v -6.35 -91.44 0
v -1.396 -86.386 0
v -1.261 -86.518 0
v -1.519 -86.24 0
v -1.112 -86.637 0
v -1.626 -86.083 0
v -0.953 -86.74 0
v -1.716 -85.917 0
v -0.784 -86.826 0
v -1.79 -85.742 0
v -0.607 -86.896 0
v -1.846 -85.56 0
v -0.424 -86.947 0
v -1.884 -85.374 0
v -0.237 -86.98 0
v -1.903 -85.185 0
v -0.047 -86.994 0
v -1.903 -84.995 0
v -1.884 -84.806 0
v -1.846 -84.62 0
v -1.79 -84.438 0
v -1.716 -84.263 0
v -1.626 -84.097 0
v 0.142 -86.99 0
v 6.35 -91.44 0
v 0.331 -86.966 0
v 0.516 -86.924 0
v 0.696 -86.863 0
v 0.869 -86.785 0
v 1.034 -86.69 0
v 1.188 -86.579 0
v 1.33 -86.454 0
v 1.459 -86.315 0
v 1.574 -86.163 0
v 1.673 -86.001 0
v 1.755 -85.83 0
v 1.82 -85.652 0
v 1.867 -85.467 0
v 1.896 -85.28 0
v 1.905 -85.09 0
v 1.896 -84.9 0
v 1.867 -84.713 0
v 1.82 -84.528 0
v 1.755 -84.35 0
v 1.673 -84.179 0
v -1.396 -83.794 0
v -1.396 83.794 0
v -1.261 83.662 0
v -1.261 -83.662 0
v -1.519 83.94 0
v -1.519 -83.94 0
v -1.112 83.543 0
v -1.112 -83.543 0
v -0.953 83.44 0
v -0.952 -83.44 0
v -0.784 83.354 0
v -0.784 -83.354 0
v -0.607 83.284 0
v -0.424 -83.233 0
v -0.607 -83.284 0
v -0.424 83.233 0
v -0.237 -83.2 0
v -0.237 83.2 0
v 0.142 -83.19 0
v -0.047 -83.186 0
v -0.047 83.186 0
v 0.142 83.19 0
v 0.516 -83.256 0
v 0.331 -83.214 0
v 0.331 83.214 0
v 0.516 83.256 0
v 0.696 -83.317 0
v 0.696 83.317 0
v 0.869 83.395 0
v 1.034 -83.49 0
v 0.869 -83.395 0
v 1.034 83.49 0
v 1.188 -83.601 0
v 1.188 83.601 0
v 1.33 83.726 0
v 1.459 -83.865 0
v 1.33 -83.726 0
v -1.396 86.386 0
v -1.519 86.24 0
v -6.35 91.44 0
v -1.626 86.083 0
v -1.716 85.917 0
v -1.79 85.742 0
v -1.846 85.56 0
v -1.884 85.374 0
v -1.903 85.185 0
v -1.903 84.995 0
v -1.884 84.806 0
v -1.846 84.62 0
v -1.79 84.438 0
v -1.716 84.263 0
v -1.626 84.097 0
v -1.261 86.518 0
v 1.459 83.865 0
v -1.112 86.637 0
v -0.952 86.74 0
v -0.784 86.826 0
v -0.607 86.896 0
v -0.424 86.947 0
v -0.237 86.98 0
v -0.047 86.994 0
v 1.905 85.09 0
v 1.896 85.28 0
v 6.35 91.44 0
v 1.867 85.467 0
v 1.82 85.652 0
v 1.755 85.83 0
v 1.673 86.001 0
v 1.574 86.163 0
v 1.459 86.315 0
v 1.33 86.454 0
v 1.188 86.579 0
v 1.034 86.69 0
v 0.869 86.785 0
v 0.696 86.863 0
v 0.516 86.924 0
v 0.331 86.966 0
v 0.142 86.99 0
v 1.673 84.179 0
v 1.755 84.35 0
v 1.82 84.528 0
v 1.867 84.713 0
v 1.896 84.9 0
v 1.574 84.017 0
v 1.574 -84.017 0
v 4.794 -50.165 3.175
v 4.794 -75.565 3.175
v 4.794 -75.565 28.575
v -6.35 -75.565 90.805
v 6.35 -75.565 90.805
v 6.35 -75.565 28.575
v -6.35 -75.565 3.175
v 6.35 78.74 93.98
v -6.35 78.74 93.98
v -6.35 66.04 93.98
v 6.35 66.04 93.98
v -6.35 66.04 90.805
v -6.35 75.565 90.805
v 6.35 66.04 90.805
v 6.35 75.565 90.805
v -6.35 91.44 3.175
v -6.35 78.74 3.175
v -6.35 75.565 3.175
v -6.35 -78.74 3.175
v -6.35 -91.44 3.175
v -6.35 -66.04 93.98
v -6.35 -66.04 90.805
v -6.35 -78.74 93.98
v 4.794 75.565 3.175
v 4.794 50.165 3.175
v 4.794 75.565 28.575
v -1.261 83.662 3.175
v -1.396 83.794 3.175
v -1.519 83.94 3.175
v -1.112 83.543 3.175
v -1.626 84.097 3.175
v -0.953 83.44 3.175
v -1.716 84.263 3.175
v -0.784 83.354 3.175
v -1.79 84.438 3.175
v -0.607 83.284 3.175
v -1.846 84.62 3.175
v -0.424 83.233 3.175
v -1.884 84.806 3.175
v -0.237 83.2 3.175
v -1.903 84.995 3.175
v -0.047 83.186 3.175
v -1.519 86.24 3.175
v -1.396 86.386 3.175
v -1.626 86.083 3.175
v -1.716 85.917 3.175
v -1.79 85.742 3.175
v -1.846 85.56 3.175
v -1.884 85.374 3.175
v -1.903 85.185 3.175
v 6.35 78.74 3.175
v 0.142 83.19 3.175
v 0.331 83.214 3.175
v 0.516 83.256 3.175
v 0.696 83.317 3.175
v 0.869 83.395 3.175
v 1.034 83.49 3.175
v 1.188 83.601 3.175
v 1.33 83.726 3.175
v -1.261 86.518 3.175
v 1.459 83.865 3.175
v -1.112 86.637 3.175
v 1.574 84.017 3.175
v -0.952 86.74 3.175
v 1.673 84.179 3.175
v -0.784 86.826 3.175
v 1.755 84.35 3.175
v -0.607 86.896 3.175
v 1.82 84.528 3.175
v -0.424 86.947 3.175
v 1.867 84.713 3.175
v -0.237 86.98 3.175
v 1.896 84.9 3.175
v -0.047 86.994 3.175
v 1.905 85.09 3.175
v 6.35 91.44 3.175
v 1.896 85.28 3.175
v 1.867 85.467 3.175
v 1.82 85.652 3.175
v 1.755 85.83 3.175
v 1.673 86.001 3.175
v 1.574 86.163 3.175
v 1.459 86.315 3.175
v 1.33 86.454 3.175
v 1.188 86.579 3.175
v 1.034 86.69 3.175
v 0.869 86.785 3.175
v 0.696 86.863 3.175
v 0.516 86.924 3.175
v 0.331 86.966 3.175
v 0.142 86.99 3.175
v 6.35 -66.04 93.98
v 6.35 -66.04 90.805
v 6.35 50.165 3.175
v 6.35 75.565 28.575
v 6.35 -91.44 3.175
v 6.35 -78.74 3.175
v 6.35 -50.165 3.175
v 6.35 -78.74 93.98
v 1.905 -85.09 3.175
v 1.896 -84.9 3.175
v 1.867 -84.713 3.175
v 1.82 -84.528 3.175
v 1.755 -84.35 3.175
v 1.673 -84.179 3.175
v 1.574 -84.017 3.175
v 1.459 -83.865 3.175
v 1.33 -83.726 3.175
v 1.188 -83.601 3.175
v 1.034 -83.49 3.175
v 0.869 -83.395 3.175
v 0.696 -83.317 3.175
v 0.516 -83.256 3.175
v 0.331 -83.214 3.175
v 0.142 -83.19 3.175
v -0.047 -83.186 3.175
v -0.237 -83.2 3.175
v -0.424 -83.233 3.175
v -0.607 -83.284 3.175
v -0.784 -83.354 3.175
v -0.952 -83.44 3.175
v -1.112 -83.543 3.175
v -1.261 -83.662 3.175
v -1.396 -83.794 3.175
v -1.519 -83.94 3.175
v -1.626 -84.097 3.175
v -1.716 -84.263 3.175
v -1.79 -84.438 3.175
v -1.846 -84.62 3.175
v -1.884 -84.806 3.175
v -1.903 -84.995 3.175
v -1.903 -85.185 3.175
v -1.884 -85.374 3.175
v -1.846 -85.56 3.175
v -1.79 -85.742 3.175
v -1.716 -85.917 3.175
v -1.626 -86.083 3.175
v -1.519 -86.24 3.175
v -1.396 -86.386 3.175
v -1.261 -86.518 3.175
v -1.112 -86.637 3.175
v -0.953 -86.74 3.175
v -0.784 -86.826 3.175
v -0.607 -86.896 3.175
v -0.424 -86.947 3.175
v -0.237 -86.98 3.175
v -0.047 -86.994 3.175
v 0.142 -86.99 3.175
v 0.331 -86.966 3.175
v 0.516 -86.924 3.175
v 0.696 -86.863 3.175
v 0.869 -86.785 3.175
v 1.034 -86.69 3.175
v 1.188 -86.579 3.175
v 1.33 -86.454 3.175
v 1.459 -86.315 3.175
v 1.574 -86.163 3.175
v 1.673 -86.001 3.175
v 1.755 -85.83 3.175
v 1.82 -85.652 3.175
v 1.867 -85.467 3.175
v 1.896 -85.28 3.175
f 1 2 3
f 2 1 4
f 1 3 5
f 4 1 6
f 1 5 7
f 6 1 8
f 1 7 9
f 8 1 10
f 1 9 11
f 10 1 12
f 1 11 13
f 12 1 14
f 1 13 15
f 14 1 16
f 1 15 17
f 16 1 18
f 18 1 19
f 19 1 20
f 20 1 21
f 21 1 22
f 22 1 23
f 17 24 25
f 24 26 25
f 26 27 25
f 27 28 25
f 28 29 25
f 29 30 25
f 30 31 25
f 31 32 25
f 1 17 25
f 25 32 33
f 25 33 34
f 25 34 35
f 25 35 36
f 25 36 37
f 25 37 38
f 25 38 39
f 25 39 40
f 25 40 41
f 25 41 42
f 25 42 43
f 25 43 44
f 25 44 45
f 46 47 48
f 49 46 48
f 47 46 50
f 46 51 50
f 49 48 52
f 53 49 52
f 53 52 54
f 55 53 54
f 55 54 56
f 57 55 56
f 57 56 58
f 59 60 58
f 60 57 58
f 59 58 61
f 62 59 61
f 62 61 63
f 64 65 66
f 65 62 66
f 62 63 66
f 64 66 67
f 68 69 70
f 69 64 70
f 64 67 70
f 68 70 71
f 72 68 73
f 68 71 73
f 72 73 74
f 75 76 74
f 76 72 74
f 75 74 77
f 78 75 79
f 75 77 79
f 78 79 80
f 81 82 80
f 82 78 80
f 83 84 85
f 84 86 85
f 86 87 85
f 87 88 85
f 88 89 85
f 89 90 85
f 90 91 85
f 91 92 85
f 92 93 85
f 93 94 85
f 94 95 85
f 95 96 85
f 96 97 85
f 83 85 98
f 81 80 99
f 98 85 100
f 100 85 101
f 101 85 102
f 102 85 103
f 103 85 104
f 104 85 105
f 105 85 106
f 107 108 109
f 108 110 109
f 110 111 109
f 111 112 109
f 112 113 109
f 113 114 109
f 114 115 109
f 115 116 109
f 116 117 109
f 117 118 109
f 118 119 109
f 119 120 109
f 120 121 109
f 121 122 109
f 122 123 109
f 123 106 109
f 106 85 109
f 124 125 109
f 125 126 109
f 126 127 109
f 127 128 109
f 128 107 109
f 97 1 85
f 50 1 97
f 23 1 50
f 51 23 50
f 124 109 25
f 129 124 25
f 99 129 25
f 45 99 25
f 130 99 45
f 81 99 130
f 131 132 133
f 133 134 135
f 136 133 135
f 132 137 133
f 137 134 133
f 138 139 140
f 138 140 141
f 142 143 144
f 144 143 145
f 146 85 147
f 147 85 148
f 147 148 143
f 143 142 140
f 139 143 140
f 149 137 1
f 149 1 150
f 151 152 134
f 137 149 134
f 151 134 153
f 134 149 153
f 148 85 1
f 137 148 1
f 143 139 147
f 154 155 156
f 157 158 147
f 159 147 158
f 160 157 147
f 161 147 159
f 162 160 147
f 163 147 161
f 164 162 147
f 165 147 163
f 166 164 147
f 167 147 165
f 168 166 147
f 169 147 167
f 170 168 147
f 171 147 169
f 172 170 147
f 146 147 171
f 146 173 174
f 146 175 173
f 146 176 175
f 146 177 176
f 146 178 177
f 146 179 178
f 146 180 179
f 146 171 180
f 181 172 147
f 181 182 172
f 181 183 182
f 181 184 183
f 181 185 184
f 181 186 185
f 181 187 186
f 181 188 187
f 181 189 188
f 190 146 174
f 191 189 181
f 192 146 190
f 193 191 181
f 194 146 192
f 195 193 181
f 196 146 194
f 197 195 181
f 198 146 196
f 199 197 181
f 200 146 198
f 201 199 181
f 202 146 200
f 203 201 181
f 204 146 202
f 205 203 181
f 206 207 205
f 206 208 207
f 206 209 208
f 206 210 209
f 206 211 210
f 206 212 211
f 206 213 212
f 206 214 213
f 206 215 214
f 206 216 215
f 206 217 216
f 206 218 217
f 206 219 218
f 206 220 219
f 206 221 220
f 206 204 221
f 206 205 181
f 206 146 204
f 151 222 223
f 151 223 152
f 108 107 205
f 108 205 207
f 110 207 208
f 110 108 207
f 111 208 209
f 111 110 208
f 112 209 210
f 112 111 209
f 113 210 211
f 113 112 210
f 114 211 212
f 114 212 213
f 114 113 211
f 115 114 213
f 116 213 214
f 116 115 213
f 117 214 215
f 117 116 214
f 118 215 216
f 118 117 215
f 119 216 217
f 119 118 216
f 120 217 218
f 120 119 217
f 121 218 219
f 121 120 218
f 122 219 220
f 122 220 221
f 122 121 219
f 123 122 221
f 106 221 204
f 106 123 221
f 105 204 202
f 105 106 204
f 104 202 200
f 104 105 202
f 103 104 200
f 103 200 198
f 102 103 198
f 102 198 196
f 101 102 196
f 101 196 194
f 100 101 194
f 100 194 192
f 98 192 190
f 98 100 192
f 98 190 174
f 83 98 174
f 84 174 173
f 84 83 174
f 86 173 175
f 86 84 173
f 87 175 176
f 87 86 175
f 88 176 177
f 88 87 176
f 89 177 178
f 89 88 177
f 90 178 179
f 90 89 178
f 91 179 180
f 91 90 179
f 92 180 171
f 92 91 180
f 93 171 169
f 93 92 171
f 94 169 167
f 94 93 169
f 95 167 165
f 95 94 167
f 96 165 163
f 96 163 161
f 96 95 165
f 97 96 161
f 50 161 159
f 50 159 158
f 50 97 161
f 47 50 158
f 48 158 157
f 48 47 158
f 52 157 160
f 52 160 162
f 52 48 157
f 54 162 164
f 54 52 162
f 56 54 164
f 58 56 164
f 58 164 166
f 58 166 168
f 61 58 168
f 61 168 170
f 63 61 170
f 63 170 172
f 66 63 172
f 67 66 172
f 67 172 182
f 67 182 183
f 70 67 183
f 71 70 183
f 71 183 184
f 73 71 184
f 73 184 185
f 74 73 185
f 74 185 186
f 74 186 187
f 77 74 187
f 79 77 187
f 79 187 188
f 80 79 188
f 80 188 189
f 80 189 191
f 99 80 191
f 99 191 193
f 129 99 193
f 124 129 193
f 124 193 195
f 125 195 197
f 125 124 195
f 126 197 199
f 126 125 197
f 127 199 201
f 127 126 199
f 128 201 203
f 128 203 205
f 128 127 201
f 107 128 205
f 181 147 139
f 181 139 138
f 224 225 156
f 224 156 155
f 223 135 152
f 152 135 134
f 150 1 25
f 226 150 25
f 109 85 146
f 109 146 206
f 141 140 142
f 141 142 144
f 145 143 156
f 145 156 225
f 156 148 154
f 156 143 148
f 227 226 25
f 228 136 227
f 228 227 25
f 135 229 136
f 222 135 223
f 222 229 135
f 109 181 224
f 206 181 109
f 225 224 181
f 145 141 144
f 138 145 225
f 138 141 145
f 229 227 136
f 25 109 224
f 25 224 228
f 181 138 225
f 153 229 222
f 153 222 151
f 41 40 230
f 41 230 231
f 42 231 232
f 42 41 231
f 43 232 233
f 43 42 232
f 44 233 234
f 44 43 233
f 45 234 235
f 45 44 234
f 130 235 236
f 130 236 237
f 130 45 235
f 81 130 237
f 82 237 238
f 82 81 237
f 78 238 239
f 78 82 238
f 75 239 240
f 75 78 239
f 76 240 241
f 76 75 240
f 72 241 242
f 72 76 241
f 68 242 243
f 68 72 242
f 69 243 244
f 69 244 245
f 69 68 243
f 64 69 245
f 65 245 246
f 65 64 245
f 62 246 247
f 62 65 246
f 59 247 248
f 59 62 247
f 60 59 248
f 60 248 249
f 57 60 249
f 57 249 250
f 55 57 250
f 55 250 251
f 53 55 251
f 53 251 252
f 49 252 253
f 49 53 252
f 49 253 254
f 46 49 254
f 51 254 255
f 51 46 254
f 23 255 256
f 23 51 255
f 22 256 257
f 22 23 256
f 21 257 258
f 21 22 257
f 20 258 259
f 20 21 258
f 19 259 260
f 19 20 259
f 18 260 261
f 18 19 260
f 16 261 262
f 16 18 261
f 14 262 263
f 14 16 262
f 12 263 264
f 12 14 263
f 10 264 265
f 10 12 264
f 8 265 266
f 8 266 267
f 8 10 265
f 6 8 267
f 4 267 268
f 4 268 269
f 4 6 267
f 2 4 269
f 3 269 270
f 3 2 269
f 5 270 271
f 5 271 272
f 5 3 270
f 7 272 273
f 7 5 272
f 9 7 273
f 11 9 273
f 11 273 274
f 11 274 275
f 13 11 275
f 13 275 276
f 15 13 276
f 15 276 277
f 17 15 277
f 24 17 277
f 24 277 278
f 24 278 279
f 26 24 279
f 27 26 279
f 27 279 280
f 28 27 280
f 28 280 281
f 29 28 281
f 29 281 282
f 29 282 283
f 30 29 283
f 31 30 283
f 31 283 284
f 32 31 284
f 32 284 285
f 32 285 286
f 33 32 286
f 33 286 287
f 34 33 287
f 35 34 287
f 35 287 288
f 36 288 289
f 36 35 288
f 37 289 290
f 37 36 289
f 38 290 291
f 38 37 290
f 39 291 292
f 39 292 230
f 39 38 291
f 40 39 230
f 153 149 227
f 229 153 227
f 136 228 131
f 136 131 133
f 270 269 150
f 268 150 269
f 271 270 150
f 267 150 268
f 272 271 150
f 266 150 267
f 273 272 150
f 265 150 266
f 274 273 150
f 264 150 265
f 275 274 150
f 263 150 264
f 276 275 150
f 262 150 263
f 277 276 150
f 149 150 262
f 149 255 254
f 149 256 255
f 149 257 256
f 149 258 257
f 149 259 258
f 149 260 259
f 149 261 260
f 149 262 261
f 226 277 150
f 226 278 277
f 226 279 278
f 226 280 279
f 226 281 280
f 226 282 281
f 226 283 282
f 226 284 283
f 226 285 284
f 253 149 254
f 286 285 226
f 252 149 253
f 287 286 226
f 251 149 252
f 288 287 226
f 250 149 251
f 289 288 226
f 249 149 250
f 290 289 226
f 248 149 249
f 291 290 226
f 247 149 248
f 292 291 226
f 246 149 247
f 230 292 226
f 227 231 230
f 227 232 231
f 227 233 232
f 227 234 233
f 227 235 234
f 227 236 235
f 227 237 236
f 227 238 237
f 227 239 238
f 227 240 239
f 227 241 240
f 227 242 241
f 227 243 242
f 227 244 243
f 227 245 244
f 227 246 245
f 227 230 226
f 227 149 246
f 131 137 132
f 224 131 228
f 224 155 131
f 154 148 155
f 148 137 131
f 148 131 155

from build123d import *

# Parameters (mm, degrees)
F0_W     = 12.7
F0_H     = 151.13
F1_DEPTH = 3.175
F0_H_2   = 3.175
F2_DEPTH = 93.98
F0_H_3   = 12.7
F0_R     = 1.905
F3_DEPTH = 3.175
F4_W     = 12.7
F4_H     = 3.175
F5_DEPTH = 9.525
F6_W     = 12.7
F6_H     = 3.175
F7_DEPTH = 9.525
F9_DEPTH = 1.55575


with BuildPart() as f1:
    # F0 (on Top) → F1 (new body)
    with BuildSketch(Plane.XY):
        Rectangle(F0_W, F0_H)
    extrude(amount=F1_DEPTH)

    # F0 (on Top) → F2 (join)
    with BuildSketch(Plane.XY):
        with Locations((0, 77.1525)):
            Rectangle(F0_W, F0_H_2)
        with Locations((0, -77.1525)):
            Rectangle(F0_W, F0_H_2)
    extrude(amount=F2_DEPTH)

    # F0 (on Top) → F3 (join)
    with BuildSketch(Plane.XY):
        with Locations((0, 85.09)):
            Rectangle(F0_W, F0_H_3)
        with Locations((0, 85.09)):
            Circle(F0_R, mode=Mode.SUBTRACT)
        with Locations((0, -85.09)):
            Rectangle(F0_W, F0_H_3)
        with Locations((0, -85.09)):
            Circle(F0_R, mode=Mode.SUBTRACT)
    extrude(amount=F3_DEPTH)

    # F4 (on face) → F5 (join)
    with BuildSketch(Plane.XZ.offset(-75.565)):
        with Locations((0, 92.3925)):
            Rectangle(F4_W, F4_H)
    extrude(amount=F5_DEPTH)

    # F6 (on face) → F7 (join)
    with BuildSketch(Plane(origin=(0, -75.565, 0), x_dir=(-1, 0, 0), z_dir=(0, 1, 0))):
        with Locations((0, 92.3925)):
            Rectangle(F6_W, F6_H)
    extrude(amount=F7_DEPTH)

    # F8 (on face) → F9 (join)
    with BuildSketch(Plane.YZ.offset(6.35)):
        Polygon((75.565, 28.575), (50.165, 3.175), (75.565, 3.175), align=None)
        Polygon((-75.565, 3.175), (-50.165, 3.175), (-75.565, 28.575), align=None)
    extrude(amount=-F9_DEPTH)


solid = f1.part
